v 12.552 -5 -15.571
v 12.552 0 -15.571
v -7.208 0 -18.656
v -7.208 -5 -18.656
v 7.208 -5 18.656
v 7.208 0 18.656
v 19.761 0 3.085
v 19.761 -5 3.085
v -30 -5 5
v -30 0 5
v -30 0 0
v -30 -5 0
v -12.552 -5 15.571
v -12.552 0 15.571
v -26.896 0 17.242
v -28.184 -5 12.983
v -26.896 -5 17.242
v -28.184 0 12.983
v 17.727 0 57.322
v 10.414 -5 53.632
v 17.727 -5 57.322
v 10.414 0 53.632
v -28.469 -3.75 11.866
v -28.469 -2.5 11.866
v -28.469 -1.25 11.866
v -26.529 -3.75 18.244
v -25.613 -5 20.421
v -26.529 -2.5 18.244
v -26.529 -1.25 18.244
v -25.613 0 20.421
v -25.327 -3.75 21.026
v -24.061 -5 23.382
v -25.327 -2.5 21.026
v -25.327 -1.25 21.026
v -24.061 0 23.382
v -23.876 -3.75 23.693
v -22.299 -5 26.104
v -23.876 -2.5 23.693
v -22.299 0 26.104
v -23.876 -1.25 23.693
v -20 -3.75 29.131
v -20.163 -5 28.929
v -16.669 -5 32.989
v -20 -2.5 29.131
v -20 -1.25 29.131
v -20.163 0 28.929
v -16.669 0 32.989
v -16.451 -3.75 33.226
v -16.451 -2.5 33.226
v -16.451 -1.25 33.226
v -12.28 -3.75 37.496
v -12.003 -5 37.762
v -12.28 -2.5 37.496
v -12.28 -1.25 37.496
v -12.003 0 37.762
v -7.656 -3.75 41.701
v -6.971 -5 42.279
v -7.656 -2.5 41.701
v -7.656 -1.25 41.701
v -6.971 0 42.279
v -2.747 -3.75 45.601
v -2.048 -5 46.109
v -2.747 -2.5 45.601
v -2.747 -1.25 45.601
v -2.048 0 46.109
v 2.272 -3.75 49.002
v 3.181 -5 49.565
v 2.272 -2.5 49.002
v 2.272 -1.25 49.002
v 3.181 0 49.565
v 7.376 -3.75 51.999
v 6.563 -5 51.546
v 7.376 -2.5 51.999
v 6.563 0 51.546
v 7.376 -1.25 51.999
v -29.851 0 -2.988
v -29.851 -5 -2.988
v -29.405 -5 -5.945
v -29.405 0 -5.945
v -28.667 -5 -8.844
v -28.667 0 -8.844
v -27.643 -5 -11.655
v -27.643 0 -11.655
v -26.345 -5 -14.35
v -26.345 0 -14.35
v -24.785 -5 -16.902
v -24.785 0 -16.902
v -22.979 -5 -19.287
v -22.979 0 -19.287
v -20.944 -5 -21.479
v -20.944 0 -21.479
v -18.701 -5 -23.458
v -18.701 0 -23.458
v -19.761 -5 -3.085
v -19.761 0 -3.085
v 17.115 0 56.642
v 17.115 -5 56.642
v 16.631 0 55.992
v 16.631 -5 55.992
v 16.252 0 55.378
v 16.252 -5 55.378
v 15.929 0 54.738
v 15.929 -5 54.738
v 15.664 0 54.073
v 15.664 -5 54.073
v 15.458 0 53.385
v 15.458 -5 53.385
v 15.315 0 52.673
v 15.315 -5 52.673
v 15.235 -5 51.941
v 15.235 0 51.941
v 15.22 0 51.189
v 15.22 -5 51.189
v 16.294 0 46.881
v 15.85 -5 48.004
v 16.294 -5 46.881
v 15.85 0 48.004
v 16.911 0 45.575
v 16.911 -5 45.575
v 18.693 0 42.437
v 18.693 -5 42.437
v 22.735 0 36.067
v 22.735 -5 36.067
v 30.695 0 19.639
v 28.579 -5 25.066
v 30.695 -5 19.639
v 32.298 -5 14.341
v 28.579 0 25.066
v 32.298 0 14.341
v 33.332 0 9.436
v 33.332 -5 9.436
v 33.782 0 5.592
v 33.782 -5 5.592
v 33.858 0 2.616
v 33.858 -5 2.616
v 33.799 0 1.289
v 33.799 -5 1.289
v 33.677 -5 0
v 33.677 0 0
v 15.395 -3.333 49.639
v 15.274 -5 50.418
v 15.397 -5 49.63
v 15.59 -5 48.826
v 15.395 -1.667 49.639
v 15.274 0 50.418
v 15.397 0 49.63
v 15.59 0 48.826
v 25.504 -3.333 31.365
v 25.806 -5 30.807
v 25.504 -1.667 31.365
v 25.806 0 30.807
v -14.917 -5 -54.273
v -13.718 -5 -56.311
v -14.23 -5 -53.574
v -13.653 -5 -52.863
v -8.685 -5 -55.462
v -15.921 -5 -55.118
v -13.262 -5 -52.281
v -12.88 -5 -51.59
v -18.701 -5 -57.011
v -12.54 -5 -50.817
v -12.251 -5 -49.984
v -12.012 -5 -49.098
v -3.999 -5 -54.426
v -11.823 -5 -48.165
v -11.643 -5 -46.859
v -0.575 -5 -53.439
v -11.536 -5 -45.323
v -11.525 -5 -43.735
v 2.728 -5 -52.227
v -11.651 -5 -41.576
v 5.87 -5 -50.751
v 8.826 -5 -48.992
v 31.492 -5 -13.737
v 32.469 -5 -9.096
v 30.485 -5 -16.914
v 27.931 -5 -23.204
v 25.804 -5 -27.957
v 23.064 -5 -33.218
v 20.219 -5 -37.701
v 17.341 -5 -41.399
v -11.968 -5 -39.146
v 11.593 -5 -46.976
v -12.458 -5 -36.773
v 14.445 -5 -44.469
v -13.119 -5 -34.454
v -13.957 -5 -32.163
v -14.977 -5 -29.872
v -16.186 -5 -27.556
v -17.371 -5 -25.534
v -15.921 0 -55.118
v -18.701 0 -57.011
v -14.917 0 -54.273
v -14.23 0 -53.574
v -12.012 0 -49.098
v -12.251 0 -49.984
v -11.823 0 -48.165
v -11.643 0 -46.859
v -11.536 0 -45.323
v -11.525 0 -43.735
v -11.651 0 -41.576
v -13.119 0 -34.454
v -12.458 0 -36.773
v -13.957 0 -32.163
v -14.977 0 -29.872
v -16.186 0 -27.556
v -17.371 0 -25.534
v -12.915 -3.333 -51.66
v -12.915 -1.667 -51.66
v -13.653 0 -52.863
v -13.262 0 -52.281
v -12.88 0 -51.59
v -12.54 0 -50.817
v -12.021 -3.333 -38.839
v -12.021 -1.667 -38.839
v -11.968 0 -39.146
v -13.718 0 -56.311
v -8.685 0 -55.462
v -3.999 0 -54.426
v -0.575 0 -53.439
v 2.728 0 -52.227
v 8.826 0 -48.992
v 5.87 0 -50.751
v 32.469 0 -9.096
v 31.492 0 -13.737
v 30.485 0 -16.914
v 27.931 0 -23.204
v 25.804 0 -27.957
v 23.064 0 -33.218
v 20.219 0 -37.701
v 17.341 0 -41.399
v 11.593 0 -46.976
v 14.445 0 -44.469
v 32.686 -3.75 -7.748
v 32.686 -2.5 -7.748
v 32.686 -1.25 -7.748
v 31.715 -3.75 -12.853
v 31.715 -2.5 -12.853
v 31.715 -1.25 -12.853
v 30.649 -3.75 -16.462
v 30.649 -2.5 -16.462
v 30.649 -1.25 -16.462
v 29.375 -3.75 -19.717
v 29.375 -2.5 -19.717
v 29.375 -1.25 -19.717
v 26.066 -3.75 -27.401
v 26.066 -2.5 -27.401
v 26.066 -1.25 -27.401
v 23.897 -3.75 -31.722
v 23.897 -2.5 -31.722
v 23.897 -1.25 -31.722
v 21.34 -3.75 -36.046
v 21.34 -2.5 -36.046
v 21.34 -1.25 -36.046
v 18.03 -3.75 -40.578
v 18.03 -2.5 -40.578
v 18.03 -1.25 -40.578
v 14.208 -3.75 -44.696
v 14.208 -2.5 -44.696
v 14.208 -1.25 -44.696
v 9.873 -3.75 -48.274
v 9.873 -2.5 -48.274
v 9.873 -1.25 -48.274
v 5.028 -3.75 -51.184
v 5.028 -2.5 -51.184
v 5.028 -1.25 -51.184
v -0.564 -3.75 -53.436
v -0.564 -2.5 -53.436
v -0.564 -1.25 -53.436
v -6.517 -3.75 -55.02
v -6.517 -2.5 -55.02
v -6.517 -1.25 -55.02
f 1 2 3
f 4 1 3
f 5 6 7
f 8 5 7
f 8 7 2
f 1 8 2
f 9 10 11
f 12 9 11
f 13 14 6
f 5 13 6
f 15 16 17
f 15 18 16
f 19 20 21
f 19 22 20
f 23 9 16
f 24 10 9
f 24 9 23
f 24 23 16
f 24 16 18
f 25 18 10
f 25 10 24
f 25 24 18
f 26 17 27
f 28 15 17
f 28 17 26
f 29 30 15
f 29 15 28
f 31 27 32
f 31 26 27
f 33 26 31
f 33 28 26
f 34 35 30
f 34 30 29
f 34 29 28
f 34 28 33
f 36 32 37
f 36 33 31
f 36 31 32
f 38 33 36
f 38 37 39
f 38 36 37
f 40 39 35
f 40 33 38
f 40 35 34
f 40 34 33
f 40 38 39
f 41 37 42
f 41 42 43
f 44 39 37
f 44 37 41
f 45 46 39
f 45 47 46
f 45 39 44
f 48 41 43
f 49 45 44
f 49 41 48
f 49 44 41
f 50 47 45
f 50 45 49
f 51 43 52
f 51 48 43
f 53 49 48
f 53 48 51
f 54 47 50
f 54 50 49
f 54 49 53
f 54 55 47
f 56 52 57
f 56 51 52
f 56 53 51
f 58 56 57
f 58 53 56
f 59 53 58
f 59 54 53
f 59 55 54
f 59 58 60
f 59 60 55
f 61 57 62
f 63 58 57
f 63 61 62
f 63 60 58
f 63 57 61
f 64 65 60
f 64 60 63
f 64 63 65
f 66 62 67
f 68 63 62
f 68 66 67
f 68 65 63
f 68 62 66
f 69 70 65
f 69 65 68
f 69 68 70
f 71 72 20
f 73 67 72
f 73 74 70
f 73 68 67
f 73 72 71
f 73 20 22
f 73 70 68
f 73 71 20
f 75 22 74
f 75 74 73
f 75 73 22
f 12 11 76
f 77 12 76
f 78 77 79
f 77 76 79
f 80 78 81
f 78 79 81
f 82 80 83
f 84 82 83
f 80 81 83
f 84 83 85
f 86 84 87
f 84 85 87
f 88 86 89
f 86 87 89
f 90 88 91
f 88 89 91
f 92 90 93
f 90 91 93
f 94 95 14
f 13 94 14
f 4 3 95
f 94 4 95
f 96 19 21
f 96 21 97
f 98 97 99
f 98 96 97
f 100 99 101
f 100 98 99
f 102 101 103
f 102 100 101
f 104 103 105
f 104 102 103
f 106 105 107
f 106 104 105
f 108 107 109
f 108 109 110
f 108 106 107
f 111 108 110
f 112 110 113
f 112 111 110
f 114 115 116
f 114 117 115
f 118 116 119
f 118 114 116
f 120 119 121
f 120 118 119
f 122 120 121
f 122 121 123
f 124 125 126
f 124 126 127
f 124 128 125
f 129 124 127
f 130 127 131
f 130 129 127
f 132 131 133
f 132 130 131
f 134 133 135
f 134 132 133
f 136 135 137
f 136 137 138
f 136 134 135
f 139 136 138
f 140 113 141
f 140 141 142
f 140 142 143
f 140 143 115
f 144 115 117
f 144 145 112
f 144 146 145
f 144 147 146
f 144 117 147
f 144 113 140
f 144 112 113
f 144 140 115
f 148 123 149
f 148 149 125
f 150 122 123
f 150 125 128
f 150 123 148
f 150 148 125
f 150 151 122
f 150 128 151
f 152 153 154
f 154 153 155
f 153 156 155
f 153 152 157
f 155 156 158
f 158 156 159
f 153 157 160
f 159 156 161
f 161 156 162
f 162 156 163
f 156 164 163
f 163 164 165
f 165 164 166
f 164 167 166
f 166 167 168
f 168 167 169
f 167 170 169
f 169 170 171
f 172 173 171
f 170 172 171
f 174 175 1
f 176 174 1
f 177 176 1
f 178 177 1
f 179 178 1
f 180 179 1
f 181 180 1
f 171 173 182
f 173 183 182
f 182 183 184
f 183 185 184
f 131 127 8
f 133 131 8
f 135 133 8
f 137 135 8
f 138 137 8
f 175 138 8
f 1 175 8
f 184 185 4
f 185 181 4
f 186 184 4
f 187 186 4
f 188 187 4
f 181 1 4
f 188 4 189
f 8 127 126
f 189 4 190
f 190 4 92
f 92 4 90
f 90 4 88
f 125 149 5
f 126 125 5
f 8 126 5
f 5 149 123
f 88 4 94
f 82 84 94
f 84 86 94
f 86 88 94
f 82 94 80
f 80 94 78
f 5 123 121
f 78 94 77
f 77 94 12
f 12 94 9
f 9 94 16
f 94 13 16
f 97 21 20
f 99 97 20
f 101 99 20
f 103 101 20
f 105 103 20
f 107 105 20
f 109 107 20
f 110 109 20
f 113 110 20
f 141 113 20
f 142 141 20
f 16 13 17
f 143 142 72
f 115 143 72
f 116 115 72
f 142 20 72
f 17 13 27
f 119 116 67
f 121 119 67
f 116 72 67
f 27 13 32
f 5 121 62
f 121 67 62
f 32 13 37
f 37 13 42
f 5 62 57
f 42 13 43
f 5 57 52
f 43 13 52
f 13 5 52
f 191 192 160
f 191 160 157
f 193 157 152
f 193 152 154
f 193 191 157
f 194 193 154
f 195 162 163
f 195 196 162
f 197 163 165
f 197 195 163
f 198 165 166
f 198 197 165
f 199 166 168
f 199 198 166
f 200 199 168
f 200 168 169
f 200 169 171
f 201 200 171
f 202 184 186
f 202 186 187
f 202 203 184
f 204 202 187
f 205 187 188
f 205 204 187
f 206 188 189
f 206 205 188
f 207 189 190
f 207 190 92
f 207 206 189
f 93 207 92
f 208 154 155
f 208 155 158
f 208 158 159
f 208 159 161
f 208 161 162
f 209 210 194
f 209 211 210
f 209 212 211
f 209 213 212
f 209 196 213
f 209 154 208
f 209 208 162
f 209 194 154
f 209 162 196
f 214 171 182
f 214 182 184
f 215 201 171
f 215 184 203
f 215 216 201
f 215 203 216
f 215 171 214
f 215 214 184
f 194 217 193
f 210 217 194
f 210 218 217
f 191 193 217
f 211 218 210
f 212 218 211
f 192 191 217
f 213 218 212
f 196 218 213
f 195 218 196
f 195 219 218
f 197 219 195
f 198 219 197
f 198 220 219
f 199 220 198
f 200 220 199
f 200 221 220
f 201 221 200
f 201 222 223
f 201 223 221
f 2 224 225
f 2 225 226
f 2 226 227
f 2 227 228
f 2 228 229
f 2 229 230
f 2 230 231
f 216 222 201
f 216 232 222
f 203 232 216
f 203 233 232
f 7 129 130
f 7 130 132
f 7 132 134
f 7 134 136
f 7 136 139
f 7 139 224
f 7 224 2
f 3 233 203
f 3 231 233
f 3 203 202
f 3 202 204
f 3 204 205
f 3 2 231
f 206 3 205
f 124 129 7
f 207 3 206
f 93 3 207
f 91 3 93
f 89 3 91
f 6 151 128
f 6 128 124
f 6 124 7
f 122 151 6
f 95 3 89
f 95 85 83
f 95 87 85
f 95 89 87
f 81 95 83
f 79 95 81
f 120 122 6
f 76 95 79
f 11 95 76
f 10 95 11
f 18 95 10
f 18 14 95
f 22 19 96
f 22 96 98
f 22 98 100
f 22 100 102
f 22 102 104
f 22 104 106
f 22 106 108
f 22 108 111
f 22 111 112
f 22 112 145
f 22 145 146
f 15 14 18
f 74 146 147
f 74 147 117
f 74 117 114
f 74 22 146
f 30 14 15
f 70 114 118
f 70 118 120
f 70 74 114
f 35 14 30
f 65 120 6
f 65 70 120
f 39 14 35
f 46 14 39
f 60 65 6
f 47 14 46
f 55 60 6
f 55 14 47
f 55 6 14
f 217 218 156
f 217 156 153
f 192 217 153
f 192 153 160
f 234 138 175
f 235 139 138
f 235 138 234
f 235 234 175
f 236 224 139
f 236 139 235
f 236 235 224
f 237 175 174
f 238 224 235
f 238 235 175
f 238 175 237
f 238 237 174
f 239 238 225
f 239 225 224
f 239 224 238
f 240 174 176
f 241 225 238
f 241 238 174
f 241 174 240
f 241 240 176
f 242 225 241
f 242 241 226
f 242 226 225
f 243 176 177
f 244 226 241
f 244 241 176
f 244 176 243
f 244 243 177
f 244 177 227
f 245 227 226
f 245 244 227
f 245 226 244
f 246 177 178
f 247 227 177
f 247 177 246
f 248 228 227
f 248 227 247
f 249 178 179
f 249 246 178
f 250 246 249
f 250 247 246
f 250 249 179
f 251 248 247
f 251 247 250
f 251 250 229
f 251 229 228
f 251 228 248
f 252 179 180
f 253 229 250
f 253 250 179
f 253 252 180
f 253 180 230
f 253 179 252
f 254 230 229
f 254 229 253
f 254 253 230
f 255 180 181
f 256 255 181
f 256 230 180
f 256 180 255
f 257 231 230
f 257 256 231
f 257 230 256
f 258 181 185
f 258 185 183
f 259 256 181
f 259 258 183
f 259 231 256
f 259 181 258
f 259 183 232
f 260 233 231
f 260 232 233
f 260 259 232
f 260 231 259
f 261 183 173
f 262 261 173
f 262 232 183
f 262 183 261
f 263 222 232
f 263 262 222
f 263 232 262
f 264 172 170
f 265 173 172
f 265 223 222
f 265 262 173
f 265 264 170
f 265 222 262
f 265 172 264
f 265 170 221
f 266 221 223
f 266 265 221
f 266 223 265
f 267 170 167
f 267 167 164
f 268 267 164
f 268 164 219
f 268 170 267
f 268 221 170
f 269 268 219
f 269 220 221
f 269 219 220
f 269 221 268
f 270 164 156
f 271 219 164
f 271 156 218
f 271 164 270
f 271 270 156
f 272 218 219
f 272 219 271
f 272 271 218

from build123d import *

# Parameters (mm, degrees)
F1_DEPTH = 5


with BuildPart() as f1:
    # F0 (on Front) → F1 (new body)
    with BuildSketch(Plane.XZ):
        with BuildLine():
            add(Edge.make_bspline(
                [(17.7268970846, 57.3215240529), (15.7368547016, 55.3111901481), (13.2864885412, 48.3492794063), (27.4724268838, 31.8894637146), (34.7996985334, 9.2238161581), (33.6772166193, 0)],
                knots=[0, 0, 0, 0, 0.0998215374, 0.2608171732, 0.4613817906, 0.4613817906, 0.4613817906, 0.4613817906], degree=3))
            add(Edge.make_bspline(
                [(-30, 5), (-29.0251400049, 9.6311227922), (-27.111556473, 18.7217002639), (-20.3931031734, 29.7414743972), (-3.0886979237, 47.0172460729), (10.8010188696, 53.8930285257), (17.7268970846, 57.3215240529)],
                knots=[0, 0, 0, 0, 0.217604872, 0.4271434889, 0.714354548, 1, 1, 1, 1], degree=3))
            Line((-30, 5), (-30, 0))
            ThreePointArc((-30, 0), (-27.0280044879, -13.0187162732), (-18.7008684399, -23.4579947906))
            add(Edge.make_bspline(
                [(-18.7008684399, -57.0112052109), (-16.3589078306, -55.4979023543), (-11.3874918945, -52.4259033179), (-11.0828909126, -37.6937310973), (-15.0989089292, -28.8739952525), (-18.7008684399, -23.4579947906)],
                knots=[0, 0, 0, 0, 0.2676818681, 0.6095268804, 1, 1, 1, 1], degree=3))
            add(Edge.make_bspline(
                [(33.6772166193, 0), (32.7849820148, -7.3317956016), (23.9235568427, -18.4163736638), (6.4508308138, -37.9844205648), (-6.683168554, -53.2337896345), (-18.7008684399, -57.0112052109)],
                knots=[0.4613817906, 0.4613817906, 0.4613817906, 0.4613817906, 0.6208059112, 0.8001995813, 1, 1, 1, 1], degree=3))
        make_face()
        Polygon((-12.5522075988, 15.5705518334), (7.2083896393, 18.6558065708), (19.7605972381, 3.0852547374), (12.5522075988, -15.5705518334), (-7.2083896393, -18.6558065708), (-19.7605972381, -3.0852547374), align=None, mode=Mode.SUBTRACT)
        with BuildLine():
            add(Edge.make_bspline(
                [(33.6772166193, 0), (32.2933898964, -12.6003254892), (30.2817412105, -17.4795691907), (22.1883431115, -37.3342070936), (6.1289464447, -53.5681106433), (-10.7206157713, -55.9326505298), (-18.7008684399, -57.0112052109)],
                knots=[0, 0, 0, 0, 0.243897848, 0.4755092955, 0.7316307838, 1, 1, 1, 1], degree=3))
            add(Edge.make_bspline(
                [(33.6772166193, 0), (32.7849820148, -7.3317956016), (23.9235568427, -18.4163736638), (6.4508308138, -37.9844205648), (-6.683168554, -53.2337896345), (-18.7008684399, -57.0112052109)],
                knots=[0.4613817906, 0.4613817906, 0.4613817906, 0.4613817906, 0.6208059112, 0.8001995813, 1, 1, 1, 1], degree=3))
        make_face()
    extrude(amount=F1_DEPTH)


solid = f1.part
